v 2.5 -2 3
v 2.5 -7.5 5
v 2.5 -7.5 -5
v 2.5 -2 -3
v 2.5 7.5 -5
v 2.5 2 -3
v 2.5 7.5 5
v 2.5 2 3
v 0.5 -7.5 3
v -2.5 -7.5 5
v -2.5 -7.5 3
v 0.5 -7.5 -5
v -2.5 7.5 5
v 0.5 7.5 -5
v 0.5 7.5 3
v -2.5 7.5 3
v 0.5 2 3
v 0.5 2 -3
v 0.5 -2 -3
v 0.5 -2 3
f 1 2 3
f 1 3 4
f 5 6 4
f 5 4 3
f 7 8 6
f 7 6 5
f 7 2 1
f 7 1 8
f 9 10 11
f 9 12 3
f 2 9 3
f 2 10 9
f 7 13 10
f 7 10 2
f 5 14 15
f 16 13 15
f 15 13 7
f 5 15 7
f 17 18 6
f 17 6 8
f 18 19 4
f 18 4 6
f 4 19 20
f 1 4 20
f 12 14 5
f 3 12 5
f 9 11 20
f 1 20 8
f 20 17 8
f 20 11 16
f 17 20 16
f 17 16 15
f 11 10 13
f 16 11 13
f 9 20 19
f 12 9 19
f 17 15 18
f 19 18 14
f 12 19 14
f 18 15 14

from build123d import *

# Parameters (mm, degrees)
SKETCH1_W           = 5
SKETCH1_H           = 15
BOSS_EXTRUDE1_DEPTH = 5
SKETCH4_W           = 3
SKETCH4_H           = 8
CUT_EXTRUDE3_DEPTH  = 15
SKETCH5_W           = 6
SKETCH5_H           = 4
CUT_EXTRUDE5_DEPTH  = 2


with BuildPart() as part:
    # Sketch1 → Boss-Extrude1 (new, symmetric)
    with BuildSketch(Plane.XY):
        Rectangle(SKETCH1_W, SKETCH1_H)
    extrude(amount=BOSS_EXTRUDE1_DEPTH, both=True)

    # Sketch4 → Cut-Extrude3 (cut)
    with BuildSketch(Plane(origin=(0, 7.5, 0), x_dir=(1, 0, 0), z_dir=(0, 1, 0))):
        with Locations((-1, 1)):
            Rectangle(SKETCH4_W, SKETCH4_H)
    extrude(amount=-CUT_EXTRUDE3_DEPTH, mode=Mode.SUBTRACT)

    # Sketch5 → Cut-Extrude5 (cut)
    with BuildSketch(Plane.ZY.offset(-0.5)):
        Rectangle(SKETCH5_W, SKETCH5_H)
    extrude(amount=-CUT_EXTRUDE5_DEPTH, mode=Mode.SUBTRACT)


solid = part.part
